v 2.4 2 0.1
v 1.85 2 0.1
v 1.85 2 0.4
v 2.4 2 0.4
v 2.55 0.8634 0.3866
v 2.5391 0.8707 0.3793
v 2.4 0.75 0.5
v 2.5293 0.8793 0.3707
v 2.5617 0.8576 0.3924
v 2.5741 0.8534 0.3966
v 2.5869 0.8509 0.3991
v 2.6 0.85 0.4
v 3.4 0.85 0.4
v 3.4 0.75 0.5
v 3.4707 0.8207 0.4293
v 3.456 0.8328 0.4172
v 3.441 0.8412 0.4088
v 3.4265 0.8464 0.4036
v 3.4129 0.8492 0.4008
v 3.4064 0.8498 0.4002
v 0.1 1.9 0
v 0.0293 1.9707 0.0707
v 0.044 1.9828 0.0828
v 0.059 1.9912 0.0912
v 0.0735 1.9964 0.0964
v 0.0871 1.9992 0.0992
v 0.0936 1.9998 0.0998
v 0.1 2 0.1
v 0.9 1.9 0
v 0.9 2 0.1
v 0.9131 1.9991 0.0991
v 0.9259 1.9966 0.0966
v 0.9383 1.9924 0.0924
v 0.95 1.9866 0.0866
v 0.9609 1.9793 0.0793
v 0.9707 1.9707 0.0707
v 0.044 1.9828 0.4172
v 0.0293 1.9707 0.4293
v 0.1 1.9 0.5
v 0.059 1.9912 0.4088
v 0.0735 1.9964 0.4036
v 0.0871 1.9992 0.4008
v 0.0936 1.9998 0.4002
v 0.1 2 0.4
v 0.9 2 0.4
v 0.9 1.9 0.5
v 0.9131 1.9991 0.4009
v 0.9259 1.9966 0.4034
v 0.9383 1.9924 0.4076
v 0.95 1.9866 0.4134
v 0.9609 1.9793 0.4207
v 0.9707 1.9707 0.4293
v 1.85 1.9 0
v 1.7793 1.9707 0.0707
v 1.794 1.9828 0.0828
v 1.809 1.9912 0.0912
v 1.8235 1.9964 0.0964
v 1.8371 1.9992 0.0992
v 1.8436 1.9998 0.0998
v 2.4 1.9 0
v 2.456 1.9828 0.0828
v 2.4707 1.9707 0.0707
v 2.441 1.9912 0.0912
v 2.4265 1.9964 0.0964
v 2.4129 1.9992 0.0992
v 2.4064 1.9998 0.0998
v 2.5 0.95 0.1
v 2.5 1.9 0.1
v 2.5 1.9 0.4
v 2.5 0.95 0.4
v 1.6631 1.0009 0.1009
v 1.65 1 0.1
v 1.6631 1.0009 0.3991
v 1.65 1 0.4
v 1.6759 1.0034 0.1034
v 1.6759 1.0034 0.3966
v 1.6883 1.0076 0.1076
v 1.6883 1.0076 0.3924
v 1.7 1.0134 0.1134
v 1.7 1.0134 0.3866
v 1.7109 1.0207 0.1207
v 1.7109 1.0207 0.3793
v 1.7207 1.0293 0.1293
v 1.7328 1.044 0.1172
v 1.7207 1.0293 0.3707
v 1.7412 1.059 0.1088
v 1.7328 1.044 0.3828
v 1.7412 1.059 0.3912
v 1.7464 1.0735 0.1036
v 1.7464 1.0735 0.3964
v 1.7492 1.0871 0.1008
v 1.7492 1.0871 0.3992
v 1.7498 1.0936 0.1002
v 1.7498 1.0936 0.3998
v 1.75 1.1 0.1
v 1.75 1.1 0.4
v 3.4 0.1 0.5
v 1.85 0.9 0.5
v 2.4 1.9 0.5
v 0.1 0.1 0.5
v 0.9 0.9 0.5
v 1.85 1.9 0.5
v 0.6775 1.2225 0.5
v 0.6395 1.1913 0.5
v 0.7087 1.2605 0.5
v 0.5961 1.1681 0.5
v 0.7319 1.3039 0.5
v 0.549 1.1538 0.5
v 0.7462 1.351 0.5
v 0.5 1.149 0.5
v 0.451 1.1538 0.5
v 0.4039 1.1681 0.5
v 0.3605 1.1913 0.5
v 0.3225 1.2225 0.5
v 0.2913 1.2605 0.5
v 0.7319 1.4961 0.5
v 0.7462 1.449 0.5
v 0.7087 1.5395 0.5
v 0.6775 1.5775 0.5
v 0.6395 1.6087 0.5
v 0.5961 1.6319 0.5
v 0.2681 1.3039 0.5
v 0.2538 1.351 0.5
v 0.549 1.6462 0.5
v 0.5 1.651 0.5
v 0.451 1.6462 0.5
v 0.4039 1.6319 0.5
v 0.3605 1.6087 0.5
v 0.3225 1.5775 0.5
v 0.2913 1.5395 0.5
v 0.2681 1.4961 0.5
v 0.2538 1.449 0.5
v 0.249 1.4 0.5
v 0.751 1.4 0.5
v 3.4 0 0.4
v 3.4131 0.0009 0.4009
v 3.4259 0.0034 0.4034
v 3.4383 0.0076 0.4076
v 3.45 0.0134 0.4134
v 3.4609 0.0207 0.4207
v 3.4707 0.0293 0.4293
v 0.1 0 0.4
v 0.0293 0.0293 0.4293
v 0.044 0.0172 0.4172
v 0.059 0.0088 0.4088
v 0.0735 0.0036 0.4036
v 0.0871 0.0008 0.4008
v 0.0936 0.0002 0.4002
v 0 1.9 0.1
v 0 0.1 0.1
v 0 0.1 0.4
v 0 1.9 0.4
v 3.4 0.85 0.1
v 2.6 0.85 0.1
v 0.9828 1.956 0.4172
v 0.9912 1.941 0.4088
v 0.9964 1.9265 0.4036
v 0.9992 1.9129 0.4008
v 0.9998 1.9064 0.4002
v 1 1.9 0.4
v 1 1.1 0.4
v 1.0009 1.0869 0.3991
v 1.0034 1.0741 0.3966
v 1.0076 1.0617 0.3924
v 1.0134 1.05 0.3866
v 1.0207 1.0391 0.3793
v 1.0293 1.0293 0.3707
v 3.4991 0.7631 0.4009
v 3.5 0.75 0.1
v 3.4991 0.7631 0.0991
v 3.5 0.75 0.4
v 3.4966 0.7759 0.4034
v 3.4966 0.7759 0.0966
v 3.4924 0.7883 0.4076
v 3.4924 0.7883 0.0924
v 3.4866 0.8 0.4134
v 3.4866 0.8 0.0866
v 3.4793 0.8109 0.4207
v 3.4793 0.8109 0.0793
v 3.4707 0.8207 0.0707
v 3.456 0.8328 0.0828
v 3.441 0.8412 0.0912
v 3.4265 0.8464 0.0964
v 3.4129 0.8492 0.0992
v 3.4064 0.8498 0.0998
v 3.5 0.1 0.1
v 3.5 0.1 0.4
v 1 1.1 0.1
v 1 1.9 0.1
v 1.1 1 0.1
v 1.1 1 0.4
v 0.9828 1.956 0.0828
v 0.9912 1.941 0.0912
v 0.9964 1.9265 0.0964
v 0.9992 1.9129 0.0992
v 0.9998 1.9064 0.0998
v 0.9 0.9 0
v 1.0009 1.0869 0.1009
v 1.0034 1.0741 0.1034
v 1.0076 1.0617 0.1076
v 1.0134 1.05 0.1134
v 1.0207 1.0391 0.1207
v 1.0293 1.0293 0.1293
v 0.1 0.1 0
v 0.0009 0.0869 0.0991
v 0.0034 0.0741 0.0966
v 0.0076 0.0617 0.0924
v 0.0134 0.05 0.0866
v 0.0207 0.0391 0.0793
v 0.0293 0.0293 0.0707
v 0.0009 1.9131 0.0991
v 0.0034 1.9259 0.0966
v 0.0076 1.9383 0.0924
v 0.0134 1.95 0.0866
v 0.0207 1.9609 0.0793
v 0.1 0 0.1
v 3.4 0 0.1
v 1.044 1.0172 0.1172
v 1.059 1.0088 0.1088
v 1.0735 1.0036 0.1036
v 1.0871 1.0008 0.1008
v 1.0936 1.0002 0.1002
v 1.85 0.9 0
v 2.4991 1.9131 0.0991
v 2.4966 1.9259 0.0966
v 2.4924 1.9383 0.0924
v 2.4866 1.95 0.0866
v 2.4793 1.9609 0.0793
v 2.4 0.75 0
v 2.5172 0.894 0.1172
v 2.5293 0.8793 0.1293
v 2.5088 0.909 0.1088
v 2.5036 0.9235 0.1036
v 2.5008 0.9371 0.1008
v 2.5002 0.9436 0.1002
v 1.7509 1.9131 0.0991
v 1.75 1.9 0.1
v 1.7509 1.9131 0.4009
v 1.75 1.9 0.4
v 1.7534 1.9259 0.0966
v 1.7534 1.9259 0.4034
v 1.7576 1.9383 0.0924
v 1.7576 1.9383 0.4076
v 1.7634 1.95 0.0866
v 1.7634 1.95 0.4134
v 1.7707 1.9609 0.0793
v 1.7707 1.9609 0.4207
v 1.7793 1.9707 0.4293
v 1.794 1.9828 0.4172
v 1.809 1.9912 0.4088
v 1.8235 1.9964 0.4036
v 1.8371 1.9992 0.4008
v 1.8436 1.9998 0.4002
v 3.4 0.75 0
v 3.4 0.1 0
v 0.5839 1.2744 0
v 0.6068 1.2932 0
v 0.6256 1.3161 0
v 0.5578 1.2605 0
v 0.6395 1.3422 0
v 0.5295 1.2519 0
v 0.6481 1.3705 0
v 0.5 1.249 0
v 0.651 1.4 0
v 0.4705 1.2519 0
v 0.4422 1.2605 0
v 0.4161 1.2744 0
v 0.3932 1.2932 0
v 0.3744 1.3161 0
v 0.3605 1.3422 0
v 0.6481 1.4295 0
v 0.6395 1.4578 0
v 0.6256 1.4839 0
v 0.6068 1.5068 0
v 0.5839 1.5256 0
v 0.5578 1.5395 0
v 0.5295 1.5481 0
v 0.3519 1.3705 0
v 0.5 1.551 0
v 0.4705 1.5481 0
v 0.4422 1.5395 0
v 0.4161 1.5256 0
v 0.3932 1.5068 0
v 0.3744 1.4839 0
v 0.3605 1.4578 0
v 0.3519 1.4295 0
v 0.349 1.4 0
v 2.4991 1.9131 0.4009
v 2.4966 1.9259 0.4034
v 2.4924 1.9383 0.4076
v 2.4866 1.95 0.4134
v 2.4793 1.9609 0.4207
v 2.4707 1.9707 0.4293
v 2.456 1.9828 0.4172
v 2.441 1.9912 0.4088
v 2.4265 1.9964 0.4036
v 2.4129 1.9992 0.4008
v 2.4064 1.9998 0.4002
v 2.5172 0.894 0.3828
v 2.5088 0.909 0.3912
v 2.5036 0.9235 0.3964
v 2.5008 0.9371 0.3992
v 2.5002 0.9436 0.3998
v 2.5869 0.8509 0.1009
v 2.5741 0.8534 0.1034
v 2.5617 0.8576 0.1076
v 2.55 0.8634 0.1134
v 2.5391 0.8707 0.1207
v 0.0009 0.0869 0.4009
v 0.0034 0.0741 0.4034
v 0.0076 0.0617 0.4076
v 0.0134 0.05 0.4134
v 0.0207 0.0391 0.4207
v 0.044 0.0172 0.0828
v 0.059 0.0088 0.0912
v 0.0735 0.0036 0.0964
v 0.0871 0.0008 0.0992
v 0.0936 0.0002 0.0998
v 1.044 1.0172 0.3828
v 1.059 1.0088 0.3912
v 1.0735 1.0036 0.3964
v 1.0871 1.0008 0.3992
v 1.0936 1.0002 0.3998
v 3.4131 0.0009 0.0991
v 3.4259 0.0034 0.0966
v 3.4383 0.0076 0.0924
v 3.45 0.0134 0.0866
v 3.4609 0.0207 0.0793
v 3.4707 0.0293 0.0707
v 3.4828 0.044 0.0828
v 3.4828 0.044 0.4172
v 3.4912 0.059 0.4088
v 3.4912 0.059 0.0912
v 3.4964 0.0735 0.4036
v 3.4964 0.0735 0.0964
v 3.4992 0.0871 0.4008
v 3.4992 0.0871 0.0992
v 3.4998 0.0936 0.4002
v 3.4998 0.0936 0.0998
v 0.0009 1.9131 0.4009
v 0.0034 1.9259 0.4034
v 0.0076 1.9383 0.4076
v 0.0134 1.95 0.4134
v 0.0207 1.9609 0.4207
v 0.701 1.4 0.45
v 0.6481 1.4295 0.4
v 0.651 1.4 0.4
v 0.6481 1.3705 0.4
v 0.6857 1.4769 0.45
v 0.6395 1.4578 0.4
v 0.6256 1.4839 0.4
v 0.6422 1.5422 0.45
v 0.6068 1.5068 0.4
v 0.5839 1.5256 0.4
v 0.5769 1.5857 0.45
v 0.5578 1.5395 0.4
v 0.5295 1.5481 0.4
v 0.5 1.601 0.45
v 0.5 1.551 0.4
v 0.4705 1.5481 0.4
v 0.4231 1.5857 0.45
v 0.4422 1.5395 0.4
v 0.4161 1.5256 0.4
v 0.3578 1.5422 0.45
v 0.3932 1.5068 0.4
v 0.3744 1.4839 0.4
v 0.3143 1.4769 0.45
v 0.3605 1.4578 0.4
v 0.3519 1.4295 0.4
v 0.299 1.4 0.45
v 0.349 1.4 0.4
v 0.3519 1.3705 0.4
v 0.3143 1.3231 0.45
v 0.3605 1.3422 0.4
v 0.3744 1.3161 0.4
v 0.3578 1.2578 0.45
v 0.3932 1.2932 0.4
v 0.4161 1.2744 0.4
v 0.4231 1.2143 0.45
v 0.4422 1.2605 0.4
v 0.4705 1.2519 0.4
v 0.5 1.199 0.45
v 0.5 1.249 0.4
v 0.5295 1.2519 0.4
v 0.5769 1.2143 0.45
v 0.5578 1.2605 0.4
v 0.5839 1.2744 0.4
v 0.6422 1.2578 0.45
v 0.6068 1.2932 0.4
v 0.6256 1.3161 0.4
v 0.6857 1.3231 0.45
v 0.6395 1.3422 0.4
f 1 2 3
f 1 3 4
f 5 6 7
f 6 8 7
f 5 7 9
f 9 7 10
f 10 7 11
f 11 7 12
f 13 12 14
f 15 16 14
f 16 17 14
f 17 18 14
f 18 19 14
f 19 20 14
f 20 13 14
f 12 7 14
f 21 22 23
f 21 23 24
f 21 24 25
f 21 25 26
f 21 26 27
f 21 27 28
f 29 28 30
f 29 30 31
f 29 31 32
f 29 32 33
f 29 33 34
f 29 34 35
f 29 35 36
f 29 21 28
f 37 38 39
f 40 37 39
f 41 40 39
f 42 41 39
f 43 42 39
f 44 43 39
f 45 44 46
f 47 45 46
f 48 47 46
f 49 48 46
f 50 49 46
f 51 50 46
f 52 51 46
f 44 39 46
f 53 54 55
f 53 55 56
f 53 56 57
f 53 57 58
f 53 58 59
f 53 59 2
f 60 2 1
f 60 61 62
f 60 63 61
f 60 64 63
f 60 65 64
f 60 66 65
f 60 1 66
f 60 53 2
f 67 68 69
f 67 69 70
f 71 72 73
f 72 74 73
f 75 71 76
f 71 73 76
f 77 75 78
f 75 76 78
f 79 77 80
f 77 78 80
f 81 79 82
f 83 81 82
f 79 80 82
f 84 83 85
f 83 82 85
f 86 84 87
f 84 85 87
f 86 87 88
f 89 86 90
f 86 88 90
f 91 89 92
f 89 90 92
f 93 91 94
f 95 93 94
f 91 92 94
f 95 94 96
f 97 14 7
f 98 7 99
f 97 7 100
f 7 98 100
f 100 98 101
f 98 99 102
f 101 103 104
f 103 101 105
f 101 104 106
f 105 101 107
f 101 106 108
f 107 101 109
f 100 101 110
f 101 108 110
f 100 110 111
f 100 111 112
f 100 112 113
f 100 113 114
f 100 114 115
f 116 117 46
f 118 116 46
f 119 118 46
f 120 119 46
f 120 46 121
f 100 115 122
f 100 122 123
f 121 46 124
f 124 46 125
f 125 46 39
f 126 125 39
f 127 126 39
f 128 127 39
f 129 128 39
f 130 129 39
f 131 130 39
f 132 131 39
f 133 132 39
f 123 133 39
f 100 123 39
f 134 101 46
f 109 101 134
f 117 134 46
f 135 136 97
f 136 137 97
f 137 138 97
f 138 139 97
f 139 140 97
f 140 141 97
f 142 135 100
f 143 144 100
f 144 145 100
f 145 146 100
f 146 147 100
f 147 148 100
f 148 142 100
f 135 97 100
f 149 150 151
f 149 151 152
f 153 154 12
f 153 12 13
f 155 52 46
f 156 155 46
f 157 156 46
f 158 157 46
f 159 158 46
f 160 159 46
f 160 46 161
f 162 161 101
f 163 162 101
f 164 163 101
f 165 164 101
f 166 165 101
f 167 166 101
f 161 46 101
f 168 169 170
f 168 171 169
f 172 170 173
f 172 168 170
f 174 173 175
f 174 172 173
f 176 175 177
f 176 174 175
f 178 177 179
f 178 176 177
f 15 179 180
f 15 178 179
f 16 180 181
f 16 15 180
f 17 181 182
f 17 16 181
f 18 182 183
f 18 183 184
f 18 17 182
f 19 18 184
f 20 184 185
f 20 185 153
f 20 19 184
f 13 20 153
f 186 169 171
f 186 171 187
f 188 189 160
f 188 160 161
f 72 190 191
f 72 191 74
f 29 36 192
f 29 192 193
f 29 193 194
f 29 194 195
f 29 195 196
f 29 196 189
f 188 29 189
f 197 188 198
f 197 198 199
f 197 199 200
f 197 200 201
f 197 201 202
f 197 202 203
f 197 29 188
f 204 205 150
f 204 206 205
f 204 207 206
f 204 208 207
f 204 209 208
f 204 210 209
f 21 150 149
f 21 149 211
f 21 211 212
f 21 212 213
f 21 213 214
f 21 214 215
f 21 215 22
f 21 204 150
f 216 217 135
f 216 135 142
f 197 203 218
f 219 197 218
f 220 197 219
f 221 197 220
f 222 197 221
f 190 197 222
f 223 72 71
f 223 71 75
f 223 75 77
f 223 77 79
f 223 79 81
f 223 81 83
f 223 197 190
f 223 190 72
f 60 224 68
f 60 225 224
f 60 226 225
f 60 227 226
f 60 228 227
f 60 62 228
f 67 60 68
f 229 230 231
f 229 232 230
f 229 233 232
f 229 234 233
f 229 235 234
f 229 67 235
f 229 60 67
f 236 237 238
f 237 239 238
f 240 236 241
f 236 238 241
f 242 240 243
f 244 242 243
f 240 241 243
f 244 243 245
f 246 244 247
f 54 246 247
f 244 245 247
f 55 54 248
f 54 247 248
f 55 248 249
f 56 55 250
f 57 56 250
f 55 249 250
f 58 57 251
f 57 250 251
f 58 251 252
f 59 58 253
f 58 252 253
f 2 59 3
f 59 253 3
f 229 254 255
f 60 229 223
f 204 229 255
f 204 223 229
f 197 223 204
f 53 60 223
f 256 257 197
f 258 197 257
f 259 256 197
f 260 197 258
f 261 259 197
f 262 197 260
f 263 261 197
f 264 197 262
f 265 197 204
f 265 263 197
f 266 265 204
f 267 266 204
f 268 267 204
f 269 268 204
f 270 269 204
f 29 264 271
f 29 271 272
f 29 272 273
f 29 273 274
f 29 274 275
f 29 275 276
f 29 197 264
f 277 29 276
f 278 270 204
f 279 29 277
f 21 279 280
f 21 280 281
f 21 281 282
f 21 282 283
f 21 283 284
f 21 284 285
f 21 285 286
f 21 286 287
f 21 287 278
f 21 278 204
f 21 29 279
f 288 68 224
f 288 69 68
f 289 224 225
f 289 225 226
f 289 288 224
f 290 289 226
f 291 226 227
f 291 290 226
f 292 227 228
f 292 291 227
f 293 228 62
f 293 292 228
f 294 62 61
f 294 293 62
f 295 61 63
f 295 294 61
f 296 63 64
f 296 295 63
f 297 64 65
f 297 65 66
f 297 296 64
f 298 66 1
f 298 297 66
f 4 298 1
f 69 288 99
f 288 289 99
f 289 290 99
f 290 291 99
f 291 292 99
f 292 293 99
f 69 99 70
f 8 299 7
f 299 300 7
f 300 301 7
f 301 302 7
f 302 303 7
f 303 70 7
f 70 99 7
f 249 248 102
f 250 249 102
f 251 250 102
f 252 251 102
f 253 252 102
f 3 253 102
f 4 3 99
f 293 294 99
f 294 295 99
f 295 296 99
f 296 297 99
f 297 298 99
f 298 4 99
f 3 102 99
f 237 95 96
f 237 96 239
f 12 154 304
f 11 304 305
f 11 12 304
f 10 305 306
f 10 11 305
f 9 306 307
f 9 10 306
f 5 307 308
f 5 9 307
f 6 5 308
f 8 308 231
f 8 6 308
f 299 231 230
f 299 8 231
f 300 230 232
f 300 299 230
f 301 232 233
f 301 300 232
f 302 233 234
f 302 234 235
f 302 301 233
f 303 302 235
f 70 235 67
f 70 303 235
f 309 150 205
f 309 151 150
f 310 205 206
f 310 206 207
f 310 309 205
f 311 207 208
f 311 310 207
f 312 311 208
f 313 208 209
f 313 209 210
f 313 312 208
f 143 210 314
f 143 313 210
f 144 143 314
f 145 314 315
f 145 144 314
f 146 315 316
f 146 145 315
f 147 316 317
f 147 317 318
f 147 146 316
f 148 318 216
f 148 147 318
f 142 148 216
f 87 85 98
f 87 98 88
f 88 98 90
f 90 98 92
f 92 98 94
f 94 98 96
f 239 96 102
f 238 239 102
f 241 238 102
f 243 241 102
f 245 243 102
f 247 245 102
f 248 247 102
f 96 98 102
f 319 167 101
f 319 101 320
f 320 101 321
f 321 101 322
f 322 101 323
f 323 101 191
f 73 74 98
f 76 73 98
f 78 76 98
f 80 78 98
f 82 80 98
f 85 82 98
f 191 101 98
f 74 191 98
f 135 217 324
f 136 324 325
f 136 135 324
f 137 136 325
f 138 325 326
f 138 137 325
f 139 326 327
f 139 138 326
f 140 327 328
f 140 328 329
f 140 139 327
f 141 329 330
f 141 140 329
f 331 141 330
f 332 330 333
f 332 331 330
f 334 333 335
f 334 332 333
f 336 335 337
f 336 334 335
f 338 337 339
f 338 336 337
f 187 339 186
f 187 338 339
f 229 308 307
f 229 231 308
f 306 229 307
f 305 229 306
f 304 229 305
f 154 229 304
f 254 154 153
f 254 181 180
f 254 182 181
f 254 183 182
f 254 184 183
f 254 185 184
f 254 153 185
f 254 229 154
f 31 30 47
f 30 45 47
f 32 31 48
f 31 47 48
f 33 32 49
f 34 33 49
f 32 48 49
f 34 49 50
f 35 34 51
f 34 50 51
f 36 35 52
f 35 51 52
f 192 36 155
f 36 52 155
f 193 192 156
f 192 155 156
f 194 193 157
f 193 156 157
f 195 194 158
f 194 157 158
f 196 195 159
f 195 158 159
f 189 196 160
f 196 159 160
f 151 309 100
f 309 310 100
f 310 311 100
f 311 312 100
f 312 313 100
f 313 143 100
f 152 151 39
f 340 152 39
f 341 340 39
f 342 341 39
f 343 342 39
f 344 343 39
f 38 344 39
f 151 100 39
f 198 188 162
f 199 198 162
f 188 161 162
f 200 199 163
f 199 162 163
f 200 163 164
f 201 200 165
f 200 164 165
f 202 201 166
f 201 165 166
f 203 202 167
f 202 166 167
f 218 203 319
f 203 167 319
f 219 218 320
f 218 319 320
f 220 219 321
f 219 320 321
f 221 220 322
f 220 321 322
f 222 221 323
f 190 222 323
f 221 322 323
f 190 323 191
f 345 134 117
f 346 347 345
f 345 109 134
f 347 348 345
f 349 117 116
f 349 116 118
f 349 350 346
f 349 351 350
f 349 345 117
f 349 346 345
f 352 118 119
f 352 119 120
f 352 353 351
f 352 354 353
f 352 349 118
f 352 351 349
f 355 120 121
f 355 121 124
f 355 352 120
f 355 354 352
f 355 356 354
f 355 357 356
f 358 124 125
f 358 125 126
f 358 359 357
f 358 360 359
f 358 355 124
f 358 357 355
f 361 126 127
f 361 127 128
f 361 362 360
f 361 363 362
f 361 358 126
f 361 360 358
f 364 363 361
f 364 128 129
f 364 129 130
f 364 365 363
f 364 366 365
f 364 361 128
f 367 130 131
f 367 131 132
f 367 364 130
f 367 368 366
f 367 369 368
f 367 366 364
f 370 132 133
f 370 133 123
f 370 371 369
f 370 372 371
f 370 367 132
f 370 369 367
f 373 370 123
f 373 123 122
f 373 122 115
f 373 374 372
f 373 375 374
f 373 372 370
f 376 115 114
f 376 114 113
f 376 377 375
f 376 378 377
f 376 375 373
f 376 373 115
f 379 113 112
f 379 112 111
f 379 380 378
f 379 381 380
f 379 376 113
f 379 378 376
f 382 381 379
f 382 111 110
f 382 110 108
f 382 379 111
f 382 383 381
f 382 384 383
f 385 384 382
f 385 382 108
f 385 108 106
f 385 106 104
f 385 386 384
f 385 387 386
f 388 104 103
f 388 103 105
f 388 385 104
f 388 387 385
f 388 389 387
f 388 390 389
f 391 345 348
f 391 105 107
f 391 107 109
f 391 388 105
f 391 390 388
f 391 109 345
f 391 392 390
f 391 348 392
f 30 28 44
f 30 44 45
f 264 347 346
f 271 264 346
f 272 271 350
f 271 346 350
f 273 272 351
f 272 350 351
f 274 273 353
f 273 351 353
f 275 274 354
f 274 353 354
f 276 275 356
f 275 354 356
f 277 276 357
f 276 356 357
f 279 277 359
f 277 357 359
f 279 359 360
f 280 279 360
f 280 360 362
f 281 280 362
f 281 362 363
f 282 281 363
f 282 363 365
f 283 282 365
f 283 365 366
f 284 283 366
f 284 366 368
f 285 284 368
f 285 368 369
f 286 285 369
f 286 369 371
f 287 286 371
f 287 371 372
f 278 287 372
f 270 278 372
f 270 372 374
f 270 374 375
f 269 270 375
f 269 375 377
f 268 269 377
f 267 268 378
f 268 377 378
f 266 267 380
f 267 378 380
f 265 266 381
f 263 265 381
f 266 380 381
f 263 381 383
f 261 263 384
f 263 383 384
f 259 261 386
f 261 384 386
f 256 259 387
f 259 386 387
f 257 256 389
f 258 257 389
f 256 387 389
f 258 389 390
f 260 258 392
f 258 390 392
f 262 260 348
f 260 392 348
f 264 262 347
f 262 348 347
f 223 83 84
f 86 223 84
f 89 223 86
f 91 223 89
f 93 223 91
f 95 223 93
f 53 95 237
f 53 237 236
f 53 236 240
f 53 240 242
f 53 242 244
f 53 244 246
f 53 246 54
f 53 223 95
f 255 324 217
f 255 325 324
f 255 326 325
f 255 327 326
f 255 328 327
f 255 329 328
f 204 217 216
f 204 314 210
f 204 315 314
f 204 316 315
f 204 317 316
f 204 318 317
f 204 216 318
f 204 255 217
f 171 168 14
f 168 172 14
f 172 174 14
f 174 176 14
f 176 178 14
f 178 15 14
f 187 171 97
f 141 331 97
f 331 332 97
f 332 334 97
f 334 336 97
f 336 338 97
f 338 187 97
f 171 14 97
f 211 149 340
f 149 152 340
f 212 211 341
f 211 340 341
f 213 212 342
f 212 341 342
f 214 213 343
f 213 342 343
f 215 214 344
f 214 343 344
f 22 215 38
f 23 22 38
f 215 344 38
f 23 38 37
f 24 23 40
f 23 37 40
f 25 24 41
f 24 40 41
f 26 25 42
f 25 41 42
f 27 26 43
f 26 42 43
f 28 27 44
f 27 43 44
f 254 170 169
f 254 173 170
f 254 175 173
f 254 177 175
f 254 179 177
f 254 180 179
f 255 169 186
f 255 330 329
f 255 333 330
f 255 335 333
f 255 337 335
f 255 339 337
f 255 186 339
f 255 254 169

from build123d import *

# Parameters (mm, degrees)
BOSS_EXTRUDE1_DEPTH = 0.5
CHAMFER1_SIZE       = 0.1
FILLET4_R           = 0.1
SKETCH2_R           = 0.151033701
CUT_EXTRUDE1_DEPTH  = 1.5
CHAMFER2_SIZE       = 0.1


with BuildPart() as part:
    # Sketch1 → Boss-Extrude1 (new body)
    with BuildSketch(Plane.XY):
        Polygon((0, 0), (0, 2), (1, 2), (1, 1), (1.75, 1), (1.75, 2), (2.5, 2), (2.5, 0.85), (3.5, 0.85), (3.5, 0), align=None)
    extrude(amount=BOSS_EXTRUDE1_DEPTH)

    # Chamfer1
    chamfer1_edges = [part.edges().sort_by_distance(p)[0] for p in [
        (0, 1, 0),
        (0.5, 2, 0),
        (1, 1.5, 0),
        (1.375, 1, 0),
        (1.75, 1.5, 0),
        (2.125, 2, 0),
        (2.5, 1.425, 0),
        (3, 0.85, 0.5),
        (3, 0.85, 0),
        (3.5, 0.425, 0),
        (1.75, 0, 0),
        (2.5, 1.425, 0.5),
        (2.125, 2, 0.5),
        (1.75, 1.5, 0.5),
        (1.375, 1, 0.5),
        (1, 1.5, 0.5),
        (0.5, 2, 0.5),
        (0, 1, 0.5),
        (1.75, 0, 0.5),
        (3.5, 0.425, 0.5),
    ]]
    chamfer(chamfer1_edges, length=CHAMFER1_SIZE)

    # Fillet4
    fillet4_edges = [part.edges().sort_by_distance(p)[0] for p in [
        (3.5, 0.85, 0.25),
        (3.5, 0, 0.25),
        (2.5, 0.85, 0.25),
        (2.5, 2, 0.25),
        (1.75, 2, 0.25),
        (1.75, 1, 0.25),
        (1, 1, 0.25),
        (1, 2, 0.25),
        (0, 2, 0.25),
        (0, 0, 0.25),
    ]]
    fillet(fillet4_edges, radius=FILLET4_R)

    # Sketch2 → Cut-Extrude1 (cut, through all)
    with BuildSketch(Plane.XY.offset(0.5)):
        with Locations((0.5, 1.4)):
            Circle(SKETCH2_R)
    extrude(amount=-CUT_EXTRUDE1_DEPTH, mode=Mode.SUBTRACT)

    # Chamfer2
    chamfer2_edges = [part.edges().sort_by_distance(p)[0] for p in [
        (0.348966299, 1.4, 0.5),
    ]]
    chamfer(chamfer2_edges, length=CHAMFER2_SIZE)


solid = part.part
